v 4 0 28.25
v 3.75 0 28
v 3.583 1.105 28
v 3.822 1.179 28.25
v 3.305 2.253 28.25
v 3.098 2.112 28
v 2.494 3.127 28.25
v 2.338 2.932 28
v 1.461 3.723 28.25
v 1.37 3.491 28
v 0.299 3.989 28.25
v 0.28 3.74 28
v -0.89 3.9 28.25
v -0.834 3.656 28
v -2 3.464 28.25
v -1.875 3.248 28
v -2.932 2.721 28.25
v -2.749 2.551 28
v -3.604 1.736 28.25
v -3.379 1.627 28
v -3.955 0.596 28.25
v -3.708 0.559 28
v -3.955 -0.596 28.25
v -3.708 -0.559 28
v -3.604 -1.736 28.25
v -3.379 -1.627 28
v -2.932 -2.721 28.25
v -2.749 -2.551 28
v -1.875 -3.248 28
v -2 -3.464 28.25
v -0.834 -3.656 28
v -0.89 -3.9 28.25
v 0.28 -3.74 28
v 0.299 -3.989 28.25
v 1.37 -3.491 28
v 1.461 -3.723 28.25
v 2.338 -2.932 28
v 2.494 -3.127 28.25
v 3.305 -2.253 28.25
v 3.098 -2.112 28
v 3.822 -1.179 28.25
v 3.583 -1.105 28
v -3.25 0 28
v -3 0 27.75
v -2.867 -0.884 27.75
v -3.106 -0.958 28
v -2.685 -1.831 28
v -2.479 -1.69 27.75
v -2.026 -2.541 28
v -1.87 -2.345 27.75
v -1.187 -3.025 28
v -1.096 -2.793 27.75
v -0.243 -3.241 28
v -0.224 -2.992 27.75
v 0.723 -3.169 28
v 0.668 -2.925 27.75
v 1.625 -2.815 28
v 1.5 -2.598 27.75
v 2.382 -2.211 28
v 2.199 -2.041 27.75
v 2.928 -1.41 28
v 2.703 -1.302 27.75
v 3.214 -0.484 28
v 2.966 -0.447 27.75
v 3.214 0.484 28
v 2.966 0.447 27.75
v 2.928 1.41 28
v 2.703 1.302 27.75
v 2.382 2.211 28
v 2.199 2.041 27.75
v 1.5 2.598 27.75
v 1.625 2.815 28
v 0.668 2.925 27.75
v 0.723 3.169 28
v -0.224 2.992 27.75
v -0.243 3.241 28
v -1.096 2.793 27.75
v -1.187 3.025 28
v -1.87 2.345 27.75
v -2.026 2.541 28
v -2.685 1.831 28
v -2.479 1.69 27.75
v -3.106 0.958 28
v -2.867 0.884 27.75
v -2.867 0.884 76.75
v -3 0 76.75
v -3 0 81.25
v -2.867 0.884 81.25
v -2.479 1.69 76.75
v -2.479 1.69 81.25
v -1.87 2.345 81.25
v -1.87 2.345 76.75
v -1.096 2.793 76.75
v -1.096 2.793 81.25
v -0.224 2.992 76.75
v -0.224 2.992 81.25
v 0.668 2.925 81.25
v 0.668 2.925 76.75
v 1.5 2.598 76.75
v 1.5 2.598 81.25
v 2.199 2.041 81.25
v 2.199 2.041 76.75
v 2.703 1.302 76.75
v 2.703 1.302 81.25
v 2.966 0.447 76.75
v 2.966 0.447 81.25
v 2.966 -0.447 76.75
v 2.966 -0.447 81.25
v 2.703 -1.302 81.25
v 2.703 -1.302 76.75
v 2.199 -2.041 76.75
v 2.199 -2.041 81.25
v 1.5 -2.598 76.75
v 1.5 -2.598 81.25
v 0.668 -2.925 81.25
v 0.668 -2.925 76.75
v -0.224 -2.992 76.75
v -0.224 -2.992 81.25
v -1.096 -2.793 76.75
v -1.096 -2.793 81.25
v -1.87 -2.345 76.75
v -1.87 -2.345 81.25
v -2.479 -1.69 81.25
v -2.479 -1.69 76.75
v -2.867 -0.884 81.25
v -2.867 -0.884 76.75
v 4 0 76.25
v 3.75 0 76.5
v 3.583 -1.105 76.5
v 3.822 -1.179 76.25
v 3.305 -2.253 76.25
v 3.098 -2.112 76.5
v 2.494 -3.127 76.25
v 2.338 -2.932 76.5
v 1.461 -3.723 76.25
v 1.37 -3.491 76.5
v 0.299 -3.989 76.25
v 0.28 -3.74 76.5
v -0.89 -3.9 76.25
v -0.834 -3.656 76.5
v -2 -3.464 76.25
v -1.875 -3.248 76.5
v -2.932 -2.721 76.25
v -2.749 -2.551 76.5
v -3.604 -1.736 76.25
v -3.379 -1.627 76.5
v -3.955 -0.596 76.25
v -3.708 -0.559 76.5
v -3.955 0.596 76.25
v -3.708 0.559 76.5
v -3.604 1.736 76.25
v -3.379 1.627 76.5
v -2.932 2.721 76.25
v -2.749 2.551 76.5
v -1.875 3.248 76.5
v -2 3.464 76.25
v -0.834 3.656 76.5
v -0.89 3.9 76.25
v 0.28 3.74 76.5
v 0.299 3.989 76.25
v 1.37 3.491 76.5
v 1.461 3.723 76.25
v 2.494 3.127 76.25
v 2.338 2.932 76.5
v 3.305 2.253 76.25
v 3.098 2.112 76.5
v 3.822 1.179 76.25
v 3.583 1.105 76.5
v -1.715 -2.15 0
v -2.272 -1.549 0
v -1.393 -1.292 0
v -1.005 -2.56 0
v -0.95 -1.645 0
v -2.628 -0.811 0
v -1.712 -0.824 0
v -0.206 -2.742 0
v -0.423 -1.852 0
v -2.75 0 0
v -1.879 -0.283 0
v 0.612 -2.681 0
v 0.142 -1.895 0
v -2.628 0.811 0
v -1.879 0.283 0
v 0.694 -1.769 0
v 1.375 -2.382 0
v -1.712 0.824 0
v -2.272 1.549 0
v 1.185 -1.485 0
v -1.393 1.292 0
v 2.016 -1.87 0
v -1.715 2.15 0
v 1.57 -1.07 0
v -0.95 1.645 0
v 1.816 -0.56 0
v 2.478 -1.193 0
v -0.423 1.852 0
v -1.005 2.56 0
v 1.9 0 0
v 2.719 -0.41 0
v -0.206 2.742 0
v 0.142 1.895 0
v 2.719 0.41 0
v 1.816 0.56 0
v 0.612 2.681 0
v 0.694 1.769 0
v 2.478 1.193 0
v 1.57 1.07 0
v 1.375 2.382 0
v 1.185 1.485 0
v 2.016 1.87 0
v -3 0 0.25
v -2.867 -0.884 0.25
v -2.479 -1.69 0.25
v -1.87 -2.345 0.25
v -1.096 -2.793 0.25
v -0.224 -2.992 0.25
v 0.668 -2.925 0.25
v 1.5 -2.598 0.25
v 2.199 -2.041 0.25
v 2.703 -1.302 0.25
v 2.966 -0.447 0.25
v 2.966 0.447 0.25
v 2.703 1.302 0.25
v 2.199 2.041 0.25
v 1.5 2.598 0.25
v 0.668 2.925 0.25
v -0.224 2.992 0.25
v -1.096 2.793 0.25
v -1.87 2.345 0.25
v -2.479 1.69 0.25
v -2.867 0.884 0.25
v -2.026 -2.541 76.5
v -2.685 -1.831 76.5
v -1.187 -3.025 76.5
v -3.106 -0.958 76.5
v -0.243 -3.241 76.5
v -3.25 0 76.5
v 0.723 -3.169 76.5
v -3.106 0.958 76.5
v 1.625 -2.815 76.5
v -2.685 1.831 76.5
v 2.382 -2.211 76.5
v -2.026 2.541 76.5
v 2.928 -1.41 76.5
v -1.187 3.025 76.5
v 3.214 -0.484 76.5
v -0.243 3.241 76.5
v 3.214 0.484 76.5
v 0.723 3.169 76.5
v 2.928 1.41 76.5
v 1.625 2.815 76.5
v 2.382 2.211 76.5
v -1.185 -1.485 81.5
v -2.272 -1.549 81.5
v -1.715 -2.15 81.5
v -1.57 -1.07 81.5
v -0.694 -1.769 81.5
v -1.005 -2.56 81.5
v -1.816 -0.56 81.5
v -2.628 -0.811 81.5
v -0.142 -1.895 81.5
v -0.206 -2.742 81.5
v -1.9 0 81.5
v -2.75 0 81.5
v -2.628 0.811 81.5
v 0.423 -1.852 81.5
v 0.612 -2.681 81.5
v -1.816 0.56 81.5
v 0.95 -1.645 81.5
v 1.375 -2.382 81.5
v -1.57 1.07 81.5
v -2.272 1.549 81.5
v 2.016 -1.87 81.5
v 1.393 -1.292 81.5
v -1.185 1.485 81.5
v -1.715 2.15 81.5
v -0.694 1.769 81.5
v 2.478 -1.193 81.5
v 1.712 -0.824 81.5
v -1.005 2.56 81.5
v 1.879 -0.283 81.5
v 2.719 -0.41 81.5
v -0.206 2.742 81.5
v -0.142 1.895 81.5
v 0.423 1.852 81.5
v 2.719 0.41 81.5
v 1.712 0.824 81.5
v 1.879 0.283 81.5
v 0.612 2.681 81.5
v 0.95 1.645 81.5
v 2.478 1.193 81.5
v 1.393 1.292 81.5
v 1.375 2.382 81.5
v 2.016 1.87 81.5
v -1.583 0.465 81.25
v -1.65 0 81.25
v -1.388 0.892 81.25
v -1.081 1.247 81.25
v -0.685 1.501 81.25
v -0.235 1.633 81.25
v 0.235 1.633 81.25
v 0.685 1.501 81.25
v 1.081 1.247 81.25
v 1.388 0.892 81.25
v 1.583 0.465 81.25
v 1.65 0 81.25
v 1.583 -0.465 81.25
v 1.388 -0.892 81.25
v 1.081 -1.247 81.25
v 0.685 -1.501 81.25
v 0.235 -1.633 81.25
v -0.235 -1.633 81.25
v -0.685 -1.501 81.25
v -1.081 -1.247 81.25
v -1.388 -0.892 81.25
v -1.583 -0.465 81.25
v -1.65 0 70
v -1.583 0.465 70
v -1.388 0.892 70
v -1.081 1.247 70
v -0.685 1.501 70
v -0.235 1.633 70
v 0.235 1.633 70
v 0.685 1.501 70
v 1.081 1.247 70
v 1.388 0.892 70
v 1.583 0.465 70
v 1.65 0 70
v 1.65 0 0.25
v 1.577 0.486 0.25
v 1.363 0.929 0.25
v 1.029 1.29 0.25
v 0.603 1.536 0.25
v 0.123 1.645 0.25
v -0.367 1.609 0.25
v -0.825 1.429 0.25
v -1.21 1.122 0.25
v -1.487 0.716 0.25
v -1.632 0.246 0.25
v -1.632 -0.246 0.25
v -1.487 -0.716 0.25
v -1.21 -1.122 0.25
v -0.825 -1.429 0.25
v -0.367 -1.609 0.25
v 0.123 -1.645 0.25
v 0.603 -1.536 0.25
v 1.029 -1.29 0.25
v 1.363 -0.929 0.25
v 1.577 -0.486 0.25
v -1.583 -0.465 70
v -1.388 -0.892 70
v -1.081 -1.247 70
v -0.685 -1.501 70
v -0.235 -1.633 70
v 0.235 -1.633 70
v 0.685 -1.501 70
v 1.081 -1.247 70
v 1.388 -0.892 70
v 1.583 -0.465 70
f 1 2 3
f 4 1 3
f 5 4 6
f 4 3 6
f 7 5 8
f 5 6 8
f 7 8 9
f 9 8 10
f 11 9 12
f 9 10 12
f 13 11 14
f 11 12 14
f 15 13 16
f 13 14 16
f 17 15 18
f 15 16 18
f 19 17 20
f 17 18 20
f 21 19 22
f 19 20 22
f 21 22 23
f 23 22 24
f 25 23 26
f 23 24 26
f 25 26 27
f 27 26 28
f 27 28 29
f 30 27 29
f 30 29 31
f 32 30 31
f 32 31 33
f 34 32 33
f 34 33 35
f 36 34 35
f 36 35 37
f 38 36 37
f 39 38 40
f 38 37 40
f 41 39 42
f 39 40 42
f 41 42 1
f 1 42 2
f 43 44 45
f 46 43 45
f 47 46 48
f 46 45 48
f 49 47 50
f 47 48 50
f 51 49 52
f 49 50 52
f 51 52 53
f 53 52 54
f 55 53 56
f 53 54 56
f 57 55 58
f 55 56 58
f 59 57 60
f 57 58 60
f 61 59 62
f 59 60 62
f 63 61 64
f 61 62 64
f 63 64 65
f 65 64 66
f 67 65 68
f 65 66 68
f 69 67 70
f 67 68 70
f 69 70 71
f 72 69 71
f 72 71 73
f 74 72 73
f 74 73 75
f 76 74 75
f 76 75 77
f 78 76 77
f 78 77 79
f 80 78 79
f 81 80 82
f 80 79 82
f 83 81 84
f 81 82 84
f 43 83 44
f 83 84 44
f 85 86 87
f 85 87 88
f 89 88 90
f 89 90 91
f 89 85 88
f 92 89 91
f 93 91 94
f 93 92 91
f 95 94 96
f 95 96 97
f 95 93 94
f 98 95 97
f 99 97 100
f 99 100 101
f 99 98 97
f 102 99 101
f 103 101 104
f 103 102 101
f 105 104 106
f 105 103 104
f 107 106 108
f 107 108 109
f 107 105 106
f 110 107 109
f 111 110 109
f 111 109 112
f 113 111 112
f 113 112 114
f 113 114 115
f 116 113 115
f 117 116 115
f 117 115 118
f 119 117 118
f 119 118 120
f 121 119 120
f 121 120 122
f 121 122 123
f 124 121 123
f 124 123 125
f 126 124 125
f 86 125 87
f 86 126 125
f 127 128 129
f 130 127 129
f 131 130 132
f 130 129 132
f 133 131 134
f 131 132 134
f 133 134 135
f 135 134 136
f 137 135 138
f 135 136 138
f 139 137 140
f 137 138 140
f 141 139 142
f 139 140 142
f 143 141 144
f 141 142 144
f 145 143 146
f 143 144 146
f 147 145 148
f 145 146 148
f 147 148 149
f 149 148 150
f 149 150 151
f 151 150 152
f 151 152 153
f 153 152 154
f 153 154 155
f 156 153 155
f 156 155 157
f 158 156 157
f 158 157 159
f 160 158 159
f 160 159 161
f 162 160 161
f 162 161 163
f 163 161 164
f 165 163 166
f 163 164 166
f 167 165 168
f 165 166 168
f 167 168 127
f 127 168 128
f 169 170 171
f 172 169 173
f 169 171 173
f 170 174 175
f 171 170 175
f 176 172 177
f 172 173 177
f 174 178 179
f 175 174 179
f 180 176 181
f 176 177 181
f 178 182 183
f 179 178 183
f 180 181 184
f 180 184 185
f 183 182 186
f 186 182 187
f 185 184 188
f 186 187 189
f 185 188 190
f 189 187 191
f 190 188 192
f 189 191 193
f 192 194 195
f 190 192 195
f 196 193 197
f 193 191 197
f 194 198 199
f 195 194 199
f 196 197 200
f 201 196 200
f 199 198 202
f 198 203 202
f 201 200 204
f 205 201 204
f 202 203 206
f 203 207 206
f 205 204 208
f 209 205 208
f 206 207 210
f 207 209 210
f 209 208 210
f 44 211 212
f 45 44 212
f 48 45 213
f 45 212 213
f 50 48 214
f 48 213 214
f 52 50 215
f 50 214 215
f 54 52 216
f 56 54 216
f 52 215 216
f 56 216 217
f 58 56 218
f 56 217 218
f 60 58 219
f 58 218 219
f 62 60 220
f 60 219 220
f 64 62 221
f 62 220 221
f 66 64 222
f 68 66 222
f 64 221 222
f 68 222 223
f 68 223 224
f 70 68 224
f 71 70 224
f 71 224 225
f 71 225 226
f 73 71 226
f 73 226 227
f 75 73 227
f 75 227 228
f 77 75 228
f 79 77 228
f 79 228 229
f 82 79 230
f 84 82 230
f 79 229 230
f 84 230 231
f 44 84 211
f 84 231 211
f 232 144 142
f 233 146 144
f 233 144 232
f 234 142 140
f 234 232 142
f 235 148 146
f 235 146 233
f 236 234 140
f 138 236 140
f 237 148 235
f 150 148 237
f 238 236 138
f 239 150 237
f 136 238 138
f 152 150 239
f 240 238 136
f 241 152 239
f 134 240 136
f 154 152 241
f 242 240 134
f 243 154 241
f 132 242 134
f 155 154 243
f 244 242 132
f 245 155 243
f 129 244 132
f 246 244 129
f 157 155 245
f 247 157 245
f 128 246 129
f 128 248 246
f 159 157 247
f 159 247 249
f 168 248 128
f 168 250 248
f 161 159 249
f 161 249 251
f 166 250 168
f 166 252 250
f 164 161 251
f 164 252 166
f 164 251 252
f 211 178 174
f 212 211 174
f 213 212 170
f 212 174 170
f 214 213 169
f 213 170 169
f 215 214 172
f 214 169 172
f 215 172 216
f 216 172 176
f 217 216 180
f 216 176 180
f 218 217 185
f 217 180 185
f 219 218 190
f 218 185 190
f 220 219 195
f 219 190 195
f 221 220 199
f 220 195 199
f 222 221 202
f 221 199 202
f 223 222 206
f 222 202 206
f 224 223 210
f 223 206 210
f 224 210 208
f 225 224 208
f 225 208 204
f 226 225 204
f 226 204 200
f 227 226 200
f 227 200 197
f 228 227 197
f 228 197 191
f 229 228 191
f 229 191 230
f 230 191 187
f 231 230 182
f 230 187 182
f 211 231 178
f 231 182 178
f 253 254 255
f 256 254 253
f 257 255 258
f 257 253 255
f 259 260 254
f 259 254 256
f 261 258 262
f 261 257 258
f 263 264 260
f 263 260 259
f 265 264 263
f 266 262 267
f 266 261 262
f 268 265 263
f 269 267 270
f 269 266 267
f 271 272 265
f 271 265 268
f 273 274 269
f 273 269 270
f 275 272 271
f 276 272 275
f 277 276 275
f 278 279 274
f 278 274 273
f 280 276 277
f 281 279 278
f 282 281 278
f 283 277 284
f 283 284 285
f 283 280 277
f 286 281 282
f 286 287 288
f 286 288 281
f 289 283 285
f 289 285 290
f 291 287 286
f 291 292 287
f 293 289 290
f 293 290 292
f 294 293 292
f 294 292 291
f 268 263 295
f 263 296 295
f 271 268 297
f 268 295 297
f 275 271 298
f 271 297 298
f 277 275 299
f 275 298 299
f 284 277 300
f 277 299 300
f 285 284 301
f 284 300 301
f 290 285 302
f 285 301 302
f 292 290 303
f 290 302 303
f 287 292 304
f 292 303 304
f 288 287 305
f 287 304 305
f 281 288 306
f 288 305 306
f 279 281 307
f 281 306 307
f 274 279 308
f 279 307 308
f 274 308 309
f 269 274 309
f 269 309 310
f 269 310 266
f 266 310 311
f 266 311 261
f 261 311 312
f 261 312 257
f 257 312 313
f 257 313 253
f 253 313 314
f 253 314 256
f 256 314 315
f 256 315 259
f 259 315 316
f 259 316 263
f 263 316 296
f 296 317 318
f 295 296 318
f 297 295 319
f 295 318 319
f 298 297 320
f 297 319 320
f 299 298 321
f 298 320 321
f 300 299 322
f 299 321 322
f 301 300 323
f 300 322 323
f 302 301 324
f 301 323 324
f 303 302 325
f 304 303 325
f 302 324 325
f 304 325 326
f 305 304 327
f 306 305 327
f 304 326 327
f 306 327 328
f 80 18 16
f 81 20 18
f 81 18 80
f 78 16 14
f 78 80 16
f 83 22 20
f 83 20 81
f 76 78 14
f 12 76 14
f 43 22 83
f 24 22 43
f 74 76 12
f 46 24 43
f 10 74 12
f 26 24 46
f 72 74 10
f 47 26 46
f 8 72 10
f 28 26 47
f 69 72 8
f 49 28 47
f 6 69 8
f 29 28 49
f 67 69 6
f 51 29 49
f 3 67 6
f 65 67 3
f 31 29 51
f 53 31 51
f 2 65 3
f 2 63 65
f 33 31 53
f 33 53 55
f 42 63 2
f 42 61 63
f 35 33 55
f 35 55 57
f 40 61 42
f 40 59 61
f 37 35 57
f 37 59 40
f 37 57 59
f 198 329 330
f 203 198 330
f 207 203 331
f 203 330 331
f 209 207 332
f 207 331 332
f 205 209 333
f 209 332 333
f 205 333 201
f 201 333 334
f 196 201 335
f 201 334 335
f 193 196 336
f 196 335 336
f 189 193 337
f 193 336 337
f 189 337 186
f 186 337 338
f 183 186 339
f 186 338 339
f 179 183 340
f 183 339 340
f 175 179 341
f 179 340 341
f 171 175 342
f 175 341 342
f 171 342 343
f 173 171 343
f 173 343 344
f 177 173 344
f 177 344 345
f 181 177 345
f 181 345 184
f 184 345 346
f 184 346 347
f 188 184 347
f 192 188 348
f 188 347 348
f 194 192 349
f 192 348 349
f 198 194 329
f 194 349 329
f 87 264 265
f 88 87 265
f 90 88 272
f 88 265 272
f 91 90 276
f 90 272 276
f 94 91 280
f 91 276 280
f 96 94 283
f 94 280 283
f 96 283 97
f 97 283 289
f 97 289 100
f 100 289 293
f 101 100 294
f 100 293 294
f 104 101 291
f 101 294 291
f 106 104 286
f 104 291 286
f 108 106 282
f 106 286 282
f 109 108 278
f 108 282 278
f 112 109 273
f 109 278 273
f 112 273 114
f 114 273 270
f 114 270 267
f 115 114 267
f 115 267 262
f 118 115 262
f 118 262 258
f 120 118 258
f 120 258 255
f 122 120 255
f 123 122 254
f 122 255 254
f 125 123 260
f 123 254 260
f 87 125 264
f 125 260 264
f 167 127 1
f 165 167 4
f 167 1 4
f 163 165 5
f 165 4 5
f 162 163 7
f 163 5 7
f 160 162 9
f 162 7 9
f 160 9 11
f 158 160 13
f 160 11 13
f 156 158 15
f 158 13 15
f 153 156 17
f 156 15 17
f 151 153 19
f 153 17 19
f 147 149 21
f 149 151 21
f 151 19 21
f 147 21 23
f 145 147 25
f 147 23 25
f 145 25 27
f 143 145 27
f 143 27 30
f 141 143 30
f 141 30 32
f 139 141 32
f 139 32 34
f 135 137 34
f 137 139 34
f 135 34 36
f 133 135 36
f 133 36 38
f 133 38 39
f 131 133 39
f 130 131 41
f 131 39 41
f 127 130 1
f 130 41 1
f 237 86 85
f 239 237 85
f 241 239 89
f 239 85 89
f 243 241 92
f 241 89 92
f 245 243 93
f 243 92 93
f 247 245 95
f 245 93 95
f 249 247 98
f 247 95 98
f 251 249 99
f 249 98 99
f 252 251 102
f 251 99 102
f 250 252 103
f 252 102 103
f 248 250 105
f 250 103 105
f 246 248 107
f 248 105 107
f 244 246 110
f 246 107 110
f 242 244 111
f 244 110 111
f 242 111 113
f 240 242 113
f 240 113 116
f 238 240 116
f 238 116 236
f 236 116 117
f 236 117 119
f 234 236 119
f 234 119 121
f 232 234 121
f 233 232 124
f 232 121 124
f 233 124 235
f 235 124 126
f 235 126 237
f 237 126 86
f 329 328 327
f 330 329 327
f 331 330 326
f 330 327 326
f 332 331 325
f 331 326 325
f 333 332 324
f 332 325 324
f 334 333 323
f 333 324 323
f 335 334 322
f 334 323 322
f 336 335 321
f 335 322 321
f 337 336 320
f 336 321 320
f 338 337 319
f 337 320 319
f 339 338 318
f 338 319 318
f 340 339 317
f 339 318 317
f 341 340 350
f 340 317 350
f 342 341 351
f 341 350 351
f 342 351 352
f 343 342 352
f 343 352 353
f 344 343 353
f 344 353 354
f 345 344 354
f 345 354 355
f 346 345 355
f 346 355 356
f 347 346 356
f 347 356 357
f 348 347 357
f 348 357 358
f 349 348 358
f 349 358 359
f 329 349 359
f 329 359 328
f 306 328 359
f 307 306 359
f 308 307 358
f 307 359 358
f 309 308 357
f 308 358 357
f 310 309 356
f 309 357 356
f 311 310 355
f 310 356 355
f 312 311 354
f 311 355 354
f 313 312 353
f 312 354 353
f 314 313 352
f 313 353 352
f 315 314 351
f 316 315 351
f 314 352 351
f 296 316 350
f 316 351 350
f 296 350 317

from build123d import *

# Parameters (mm, degrees)
ESQUISSE1_R           = 4
BOSS_EXTRU_1_DEPTH    = 81.5
ESQUISSE2_W           = 28
ESQUISSE2_H           = 1
ESQUISSE3_W           = 5
ESQUISSE3_H           = 1
TROU_TARAUD_M41_D     = 3.3
TROU_TARAUD_M41_DEPTH = 11.5
TROU_TARAUD_M41_TIP   = 0.991420021
TROU_TARAUD_M43_D     = 3.3
CHANFREIN1_SIZE       = 0.25


with BuildPart() as part:
    # Esquisse1 → Boss.-Extru.1 (new body)
    with BuildSketch(Plane.XY):
        Circle(ESQUISSE1_R)
    extrude(amount=BOSS_EXTRU_1_DEPTH)

    # Esquisse2 → Enlèvement de matière-Révolution1 (revolve, cut)
    with BuildSketch(Plane(origin=(0, 0, 0), x_dir=(0, 0, -1), z_dir=(1, 0, 0)), mode=Mode.PRIVATE) as enl_vement_de_mati_re_r_volution1_sk:
        with Locations((-14, 3.5)):
            Rectangle(ESQUISSE2_W, ESQUISSE2_H)
    revolve(enl_vement_de_mati_re_r_volution1_sk.sketch.rotate(Axis((0, 0, 0), (0, 0, 1)), 90), axis=Axis((0, 0, 0), (0, 0, 1)), mode=Mode.SUBTRACT)

    # Esquisse3 → Enlèvement de matière-Révolution2 (revolve, cut)
    with BuildSketch(Plane(origin=(0, 0, 0), x_dir=(0, 0, -1), z_dir=(1, 0, 0)), mode=Mode.PRIVATE) as enl_vement_de_mati_re_r_volution2_sk:
        with Locations((-79, 3.5)):
            Rectangle(ESQUISSE3_W, ESQUISSE3_H)
    revolve(enl_vement_de_mati_re_r_volution2_sk.sketch.rotate(Axis((0, 0, 81.5), (0, 0, -1)), 270), axis=Axis((0, 0, 81.5), (0, 0, -1)), mode=Mode.SUBTRACT)

    # Trou taraudé M41
    with Locations(Plane.XY.offset(81.5)):
        with Locations((0, 0)):
            Hole(TROU_TARAUD_M41_D / 2, depth=TROU_TARAUD_M41_DEPTH)
            with Locations((0, 0, -(TROU_TARAUD_M41_DEPTH + TROU_TARAUD_M41_TIP / 2))):  # 118° drill point
                Cone(0, TROU_TARAUD_M41_D / 2, TROU_TARAUD_M41_TIP, mode=Mode.SUBTRACT)

    # Trou taraudé M43 (through all)
    with Locations(Plane(origin=(0, 0, 0), x_dir=(-1, 0, 0), z_dir=(0, 0, -1))):
        with Locations((0, 0)):
            Hole(TROU_TARAUD_M43_D / 2)

    # Chanfrein1
    chanfrein1_edges = [part.edges().sort_by_distance(p)[0] for p in [
        (3, 0, 81.5),
        (3, 0, 76.5),
        (-4, 0, 76.5),
        (0, 1.65, 81.5),
        (-1.65, 0, 0),
        (3, 0, 0),
        (3, 0, 28),
        (-4, 0, 28),
    ]]
    chamfer(chanfrein1_edges, length=CHANFREIN1_SIZE)


solid = part.part
